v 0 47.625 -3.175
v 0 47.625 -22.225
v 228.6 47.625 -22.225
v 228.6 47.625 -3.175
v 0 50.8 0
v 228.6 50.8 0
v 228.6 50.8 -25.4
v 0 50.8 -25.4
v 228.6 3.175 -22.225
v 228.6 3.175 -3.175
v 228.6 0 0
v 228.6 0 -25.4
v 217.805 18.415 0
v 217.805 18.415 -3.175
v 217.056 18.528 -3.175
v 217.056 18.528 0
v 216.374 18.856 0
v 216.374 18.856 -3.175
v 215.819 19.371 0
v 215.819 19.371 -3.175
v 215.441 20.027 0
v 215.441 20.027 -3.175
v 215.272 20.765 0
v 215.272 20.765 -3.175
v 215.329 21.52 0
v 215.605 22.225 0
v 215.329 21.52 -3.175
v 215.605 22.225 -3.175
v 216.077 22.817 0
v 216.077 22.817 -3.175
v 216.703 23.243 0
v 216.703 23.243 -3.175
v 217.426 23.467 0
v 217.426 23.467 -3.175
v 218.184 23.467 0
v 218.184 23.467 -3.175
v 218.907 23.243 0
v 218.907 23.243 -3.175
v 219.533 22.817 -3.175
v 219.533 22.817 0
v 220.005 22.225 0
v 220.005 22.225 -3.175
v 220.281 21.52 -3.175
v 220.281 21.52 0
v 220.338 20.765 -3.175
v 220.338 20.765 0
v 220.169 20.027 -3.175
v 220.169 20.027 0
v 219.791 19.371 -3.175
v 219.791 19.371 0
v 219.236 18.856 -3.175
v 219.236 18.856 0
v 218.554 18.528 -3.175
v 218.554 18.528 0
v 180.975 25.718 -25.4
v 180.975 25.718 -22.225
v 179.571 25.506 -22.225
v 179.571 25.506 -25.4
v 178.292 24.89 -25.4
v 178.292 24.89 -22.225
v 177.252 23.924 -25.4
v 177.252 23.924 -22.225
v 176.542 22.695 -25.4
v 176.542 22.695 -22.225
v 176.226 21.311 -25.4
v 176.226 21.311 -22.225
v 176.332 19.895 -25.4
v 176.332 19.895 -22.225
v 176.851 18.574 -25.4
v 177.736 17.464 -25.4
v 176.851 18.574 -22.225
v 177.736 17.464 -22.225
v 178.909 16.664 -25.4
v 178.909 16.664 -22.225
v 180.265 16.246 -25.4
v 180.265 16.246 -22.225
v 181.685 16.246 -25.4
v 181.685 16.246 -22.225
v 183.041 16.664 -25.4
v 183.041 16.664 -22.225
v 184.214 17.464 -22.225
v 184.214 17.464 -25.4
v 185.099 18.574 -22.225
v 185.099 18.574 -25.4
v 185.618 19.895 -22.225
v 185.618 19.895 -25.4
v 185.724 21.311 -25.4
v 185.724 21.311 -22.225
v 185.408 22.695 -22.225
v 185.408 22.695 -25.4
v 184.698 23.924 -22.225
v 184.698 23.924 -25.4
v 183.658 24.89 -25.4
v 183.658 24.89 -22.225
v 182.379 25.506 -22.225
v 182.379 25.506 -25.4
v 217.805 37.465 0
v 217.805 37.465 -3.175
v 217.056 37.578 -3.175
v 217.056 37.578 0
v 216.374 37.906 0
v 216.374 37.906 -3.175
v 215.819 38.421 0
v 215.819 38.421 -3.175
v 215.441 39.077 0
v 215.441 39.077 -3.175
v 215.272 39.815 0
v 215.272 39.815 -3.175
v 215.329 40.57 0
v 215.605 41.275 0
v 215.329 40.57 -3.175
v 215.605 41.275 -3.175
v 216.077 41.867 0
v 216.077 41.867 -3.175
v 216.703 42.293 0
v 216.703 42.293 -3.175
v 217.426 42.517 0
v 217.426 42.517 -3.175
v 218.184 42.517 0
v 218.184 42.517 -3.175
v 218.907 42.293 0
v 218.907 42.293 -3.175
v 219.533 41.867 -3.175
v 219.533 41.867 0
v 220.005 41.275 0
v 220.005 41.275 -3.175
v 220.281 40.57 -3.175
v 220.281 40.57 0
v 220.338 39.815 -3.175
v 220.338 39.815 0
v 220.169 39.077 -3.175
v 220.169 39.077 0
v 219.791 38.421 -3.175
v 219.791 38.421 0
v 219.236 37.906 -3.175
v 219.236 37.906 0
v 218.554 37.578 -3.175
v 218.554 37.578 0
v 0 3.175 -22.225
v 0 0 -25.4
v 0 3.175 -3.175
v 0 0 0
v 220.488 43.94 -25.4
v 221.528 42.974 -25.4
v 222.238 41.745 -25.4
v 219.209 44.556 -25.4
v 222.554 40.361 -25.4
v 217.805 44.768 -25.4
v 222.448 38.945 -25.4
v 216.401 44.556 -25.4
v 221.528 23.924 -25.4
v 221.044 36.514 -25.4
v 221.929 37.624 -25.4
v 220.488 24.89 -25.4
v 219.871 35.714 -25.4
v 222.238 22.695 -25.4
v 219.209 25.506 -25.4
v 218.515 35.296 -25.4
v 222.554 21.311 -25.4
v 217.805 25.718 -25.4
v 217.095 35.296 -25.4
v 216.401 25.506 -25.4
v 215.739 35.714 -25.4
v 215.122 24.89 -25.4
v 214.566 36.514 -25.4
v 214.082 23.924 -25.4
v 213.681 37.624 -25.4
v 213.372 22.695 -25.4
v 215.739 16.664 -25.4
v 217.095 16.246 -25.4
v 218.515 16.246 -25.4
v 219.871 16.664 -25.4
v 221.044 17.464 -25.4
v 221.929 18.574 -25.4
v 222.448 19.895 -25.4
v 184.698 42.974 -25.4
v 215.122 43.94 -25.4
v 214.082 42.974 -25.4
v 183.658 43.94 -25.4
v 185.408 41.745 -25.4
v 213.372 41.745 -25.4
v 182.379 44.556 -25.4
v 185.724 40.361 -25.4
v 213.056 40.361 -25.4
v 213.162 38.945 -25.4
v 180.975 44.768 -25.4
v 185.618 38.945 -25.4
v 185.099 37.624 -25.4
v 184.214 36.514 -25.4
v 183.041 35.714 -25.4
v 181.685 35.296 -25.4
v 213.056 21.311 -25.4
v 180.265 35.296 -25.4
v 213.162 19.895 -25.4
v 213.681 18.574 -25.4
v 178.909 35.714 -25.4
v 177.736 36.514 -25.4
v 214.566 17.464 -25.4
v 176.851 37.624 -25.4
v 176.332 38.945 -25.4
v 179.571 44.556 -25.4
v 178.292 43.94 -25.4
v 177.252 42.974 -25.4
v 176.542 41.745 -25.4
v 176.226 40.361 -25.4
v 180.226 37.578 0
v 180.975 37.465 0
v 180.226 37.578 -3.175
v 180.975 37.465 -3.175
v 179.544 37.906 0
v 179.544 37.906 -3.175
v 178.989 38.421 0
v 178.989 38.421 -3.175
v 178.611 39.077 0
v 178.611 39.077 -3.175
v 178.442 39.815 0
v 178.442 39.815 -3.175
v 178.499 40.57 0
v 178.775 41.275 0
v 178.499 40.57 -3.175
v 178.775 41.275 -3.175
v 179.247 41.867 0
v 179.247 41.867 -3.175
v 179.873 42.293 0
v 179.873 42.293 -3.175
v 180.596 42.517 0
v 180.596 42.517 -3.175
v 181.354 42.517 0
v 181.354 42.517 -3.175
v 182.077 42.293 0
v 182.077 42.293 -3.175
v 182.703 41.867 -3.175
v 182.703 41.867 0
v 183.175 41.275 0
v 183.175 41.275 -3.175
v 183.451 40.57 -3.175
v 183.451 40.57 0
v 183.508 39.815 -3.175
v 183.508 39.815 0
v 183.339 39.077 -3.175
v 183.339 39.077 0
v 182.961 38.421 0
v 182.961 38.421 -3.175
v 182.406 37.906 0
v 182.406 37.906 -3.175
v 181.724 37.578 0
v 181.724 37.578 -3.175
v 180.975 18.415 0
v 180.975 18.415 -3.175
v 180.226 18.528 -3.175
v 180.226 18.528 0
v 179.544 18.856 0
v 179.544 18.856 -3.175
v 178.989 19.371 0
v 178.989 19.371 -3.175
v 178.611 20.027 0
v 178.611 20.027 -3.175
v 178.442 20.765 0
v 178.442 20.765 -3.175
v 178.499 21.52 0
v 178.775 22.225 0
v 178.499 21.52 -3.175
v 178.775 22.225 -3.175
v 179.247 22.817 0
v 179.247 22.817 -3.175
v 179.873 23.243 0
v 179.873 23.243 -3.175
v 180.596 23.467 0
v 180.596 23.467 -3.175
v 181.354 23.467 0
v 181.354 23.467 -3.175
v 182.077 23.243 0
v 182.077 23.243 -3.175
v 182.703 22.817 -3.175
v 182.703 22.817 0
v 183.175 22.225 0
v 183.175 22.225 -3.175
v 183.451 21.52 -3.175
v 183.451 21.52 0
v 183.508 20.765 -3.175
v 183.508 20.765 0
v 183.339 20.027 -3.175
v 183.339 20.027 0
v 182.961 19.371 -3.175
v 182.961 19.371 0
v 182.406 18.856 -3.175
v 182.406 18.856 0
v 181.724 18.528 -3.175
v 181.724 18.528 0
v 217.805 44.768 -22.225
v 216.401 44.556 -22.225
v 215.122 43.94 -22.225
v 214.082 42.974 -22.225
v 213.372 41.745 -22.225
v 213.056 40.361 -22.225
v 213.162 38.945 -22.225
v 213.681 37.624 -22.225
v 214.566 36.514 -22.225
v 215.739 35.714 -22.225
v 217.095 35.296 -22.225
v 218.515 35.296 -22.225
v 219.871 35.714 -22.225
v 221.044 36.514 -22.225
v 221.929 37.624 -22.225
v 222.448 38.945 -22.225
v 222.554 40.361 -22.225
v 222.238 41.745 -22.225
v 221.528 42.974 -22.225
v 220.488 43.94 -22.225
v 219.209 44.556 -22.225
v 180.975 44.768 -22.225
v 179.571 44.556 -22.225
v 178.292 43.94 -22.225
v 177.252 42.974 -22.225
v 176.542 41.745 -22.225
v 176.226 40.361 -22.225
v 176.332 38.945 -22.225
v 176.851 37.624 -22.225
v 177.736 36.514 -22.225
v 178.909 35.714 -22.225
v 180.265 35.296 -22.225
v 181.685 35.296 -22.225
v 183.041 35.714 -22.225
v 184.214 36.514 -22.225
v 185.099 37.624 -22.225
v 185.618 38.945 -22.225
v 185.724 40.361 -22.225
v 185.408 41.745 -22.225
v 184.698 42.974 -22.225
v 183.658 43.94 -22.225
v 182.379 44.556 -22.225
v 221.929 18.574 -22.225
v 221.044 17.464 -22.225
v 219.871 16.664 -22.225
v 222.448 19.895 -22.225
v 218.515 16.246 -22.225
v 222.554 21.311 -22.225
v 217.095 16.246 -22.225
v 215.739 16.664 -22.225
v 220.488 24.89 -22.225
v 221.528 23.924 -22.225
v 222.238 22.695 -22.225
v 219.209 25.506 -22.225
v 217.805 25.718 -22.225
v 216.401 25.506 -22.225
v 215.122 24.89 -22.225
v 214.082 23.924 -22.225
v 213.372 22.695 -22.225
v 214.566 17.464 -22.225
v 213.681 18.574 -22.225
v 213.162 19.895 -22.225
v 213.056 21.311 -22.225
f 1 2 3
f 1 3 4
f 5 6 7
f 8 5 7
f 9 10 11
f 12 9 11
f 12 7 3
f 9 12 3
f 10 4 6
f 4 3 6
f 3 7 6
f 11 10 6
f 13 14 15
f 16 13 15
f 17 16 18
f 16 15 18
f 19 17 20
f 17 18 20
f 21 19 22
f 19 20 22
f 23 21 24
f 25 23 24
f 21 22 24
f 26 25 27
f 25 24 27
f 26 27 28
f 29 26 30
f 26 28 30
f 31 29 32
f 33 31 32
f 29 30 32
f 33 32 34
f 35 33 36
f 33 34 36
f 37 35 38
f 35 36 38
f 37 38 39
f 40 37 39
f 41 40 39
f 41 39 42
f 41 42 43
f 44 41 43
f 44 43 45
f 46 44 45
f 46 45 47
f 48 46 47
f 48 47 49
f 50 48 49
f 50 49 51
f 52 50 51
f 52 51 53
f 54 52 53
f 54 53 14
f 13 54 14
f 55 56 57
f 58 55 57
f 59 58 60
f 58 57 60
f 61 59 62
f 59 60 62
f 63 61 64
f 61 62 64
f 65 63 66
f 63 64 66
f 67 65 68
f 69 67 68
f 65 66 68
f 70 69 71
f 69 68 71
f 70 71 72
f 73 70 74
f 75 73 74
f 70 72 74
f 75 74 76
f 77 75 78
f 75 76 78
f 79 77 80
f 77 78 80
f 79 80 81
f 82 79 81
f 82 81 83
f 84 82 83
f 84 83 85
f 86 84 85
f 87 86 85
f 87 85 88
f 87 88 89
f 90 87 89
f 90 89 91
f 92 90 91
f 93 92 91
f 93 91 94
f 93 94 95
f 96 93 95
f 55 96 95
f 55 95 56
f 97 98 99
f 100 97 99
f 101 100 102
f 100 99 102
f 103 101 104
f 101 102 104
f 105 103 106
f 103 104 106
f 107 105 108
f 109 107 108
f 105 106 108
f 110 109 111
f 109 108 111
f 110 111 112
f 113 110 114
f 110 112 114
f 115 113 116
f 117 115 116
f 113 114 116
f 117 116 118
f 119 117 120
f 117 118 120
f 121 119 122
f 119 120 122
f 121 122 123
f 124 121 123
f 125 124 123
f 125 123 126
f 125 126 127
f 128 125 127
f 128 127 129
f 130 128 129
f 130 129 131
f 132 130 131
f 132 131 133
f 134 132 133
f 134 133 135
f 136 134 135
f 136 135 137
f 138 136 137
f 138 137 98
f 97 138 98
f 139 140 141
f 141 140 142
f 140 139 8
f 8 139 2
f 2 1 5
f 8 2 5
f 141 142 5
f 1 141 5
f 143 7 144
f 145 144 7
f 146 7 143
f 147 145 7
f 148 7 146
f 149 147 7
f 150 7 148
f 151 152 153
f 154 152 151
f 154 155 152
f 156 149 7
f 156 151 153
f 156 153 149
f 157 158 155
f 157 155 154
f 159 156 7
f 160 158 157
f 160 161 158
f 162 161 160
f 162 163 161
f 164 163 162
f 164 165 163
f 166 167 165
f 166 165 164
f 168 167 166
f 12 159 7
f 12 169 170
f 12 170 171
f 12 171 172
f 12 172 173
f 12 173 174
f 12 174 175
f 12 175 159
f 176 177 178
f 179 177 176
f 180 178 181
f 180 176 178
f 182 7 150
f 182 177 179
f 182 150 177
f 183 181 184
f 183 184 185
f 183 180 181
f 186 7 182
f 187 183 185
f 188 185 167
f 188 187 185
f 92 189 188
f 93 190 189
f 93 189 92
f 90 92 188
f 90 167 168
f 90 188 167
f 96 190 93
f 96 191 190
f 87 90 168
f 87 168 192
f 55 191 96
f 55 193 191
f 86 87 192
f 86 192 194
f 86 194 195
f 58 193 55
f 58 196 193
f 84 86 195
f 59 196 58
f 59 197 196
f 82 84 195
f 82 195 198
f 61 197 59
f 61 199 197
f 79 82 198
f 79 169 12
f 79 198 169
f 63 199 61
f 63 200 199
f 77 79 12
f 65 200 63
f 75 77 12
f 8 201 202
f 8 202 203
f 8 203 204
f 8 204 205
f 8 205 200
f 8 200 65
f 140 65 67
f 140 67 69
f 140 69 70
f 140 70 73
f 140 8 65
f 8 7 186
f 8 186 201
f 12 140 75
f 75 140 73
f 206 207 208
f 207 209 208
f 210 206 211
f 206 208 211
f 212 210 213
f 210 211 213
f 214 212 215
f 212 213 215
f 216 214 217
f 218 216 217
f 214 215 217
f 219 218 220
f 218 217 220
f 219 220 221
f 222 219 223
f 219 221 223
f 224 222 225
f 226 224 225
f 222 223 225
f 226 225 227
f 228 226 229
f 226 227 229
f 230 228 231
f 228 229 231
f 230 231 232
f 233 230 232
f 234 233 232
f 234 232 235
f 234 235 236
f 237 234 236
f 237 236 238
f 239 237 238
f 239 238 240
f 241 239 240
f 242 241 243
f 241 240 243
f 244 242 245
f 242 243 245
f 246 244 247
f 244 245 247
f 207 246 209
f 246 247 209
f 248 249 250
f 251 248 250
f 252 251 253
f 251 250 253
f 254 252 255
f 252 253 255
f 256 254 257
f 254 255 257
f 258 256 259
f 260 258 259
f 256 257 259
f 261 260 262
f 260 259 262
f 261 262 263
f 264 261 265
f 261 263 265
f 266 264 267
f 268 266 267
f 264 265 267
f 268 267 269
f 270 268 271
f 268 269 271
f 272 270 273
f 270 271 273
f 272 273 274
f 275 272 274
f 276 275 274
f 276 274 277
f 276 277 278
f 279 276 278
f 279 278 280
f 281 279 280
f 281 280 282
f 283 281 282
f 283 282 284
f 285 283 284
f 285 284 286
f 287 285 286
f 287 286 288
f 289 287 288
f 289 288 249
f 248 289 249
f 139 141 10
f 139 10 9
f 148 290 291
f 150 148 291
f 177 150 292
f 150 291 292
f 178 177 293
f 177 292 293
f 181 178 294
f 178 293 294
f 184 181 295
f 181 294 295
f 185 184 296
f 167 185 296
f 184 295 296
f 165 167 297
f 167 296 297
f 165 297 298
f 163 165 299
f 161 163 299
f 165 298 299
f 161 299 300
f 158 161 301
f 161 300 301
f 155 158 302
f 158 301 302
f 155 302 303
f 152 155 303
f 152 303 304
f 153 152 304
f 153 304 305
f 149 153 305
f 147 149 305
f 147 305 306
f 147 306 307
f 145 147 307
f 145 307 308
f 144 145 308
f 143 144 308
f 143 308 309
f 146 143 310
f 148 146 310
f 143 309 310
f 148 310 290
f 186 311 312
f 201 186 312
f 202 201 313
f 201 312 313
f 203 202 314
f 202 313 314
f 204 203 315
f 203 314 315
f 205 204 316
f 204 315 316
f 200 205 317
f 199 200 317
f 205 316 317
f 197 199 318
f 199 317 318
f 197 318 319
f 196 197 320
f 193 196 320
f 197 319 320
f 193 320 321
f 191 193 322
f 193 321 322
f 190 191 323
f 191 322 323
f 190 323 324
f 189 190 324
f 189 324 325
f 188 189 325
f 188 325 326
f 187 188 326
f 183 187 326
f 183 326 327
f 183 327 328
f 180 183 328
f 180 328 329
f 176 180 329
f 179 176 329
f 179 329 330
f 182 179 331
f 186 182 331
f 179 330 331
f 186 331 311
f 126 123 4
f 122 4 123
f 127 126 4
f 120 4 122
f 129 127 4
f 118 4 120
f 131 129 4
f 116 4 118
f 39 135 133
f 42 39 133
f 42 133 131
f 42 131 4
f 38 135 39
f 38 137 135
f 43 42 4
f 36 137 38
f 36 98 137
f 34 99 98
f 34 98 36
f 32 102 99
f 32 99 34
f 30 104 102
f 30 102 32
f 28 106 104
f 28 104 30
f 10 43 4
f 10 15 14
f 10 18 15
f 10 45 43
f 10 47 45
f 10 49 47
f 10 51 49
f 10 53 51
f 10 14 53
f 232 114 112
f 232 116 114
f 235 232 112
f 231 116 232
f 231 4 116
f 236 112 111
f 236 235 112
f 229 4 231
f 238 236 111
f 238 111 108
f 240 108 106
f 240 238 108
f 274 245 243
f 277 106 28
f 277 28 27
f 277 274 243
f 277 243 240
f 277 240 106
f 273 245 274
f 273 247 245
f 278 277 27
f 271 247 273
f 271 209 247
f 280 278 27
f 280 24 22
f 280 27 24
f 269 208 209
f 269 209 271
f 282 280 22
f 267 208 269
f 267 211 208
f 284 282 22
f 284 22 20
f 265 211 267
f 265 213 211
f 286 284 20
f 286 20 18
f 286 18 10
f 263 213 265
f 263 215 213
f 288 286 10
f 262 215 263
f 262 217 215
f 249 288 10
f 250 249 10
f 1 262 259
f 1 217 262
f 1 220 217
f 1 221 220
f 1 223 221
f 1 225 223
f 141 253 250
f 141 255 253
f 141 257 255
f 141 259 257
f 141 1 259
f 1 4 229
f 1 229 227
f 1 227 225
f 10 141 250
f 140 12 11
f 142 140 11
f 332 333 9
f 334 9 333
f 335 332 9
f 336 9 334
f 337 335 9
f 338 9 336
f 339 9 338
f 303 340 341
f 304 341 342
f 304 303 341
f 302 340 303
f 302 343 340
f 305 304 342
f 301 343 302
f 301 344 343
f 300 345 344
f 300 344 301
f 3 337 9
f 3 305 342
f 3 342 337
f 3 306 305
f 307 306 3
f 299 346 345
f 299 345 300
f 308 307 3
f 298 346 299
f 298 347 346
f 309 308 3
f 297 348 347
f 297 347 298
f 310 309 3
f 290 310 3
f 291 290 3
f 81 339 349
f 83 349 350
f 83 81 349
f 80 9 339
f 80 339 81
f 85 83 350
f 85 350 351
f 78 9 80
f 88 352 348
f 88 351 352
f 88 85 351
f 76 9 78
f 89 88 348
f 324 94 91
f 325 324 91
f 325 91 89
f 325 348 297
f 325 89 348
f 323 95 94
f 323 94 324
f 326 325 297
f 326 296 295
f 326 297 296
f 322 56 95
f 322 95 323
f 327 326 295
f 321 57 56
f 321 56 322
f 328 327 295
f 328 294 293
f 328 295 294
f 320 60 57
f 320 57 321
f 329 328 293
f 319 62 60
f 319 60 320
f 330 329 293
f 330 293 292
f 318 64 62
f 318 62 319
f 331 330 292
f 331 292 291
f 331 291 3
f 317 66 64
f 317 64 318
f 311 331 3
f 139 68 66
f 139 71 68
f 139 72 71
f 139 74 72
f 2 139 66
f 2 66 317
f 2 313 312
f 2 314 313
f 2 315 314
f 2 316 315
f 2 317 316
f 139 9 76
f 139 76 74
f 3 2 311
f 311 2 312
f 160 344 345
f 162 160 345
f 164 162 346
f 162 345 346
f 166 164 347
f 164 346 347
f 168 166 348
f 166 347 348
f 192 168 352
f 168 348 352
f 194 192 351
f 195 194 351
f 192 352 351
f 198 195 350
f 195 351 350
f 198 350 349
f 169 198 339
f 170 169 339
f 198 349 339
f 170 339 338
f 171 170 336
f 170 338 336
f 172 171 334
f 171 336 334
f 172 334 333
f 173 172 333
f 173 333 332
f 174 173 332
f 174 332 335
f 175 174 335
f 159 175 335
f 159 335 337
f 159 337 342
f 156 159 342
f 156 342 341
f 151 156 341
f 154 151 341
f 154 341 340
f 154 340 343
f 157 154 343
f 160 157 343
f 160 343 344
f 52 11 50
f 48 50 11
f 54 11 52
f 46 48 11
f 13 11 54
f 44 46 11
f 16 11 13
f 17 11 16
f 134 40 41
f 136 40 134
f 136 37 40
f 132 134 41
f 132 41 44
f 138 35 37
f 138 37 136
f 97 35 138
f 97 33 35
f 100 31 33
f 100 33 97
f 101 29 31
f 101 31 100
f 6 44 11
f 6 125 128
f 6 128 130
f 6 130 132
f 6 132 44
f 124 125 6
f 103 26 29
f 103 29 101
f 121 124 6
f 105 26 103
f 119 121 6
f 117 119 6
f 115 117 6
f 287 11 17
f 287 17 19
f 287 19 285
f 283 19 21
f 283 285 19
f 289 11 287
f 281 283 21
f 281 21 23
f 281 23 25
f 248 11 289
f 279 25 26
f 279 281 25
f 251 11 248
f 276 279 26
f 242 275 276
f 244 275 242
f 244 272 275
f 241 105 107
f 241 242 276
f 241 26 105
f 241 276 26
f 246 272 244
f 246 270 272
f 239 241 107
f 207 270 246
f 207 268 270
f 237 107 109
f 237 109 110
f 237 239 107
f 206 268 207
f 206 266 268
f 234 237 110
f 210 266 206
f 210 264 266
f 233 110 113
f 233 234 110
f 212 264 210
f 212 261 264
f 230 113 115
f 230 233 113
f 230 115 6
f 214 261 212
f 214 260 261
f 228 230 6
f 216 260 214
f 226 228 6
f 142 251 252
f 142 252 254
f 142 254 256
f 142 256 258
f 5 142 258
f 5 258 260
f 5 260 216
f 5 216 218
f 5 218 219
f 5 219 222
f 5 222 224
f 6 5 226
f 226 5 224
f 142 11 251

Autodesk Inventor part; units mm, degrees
ref_plane "YZ Plane" through (0, 0, 0) normal (1, 0, 0) x (0, 1, 0)
ref_plane "XZ Plane" through (0, 0, 0) normal (0, 1, 0) x (-1, 0, 0)
ref_plane "XY Plane" through (0, 0, 0) normal (0, 0, 1) x (1, 0, 0)
sketch "Sketch1" plane through (0, 0, 0) normal (1, 0, 0) x (0, 1, 0)
  line L0 (0, 0) -> (50.8, 0)
  line L1 (50.8, 0) -> (50.8, -25.4)
  line L2 (50.8, -25.4) -> (0, -25.4)
  line L3 (0, -25.4) -> (0, 0)
  line L4 (47.625, -22.225) -> (47.625, -3.175)
  line L5 (47.625, -3.175) -> (3.175, -3.175)
  line L6 (3.175, -3.175) -> (3.175, -22.225)
  line L7 (3.175, -22.225) -> (47.625, -22.225)
  dimension "d0" = 50.8
  dimension "d1" = 25.4
  dimension "d2" = 3.175
extrude "Extrusion1" add sketch "Sketch1" along normal blind 685.8
sketch "Sketch2" plane through (0, 50.8, 0) normal (0, 1, 0) x (1, 0, 0)
  line L0 (0, 0) -> (0, 25.4) projected
  line L1 (0, 0) -> (685.8, 0) projected
  line L2 (685.8, 25.4) -> (685.8, 0) projected
  line L3 (0, 25.4) -> (685.8, 25.4) projected
  line L4 (0, 0) -> (685.8, 0) projected
  line L5 (228.6, 0) -> (685.8, 0)
  line L6 (685.8, 0) -> (685.8, 25.4)
  line L7 (685.8, 25.4) -> (228.6, 25.4)
  line L8 (228.6, 25.4) -> (228.6, 0)
extrude "Extrusion2" cut sketch "Sketch2" against normal blind 685.8 contours L8 L3 L2 L1
hole "Hole1" at (217.805, 40.005, 0) direction (0, 0, -1) diameter 5.08 depth 12.7 tip angle 118
hole "Hole2" at (217.805, 20.955, 0) direction (0, 0, -1) diameter 5.08 depth 12.7 tip angle 118
pattern_linear "Rectangular Pattern1" count 2 spacing 36.83 along (-1, 0, 0) of "Hole1"
pattern_linear "Rectangular Pattern2" count 2 spacing 36.83 along (-1, 0, 0) of "Hole2"
hole "Hole3" at (217.805, 40.005, -25.4) direction (0, 0, 1) diameter 9.525 depth 12.7 tip angle 118
pattern_linear "Rectangular Pattern4" count 2 spacing 36.83 along (-1, 0, 0) of "Hole3"
hole "Hole4" at (217.805, 20.955, -25.4) direction (0, 0, 1) diameter 9.525 depth 12.7 tip angle 118
pattern_linear "Rectangular Pattern5" count 2 spacing 36.83 along (-1, 0, 0) of "Hole4"
properties part number "Modified Front Frame 27 in"
